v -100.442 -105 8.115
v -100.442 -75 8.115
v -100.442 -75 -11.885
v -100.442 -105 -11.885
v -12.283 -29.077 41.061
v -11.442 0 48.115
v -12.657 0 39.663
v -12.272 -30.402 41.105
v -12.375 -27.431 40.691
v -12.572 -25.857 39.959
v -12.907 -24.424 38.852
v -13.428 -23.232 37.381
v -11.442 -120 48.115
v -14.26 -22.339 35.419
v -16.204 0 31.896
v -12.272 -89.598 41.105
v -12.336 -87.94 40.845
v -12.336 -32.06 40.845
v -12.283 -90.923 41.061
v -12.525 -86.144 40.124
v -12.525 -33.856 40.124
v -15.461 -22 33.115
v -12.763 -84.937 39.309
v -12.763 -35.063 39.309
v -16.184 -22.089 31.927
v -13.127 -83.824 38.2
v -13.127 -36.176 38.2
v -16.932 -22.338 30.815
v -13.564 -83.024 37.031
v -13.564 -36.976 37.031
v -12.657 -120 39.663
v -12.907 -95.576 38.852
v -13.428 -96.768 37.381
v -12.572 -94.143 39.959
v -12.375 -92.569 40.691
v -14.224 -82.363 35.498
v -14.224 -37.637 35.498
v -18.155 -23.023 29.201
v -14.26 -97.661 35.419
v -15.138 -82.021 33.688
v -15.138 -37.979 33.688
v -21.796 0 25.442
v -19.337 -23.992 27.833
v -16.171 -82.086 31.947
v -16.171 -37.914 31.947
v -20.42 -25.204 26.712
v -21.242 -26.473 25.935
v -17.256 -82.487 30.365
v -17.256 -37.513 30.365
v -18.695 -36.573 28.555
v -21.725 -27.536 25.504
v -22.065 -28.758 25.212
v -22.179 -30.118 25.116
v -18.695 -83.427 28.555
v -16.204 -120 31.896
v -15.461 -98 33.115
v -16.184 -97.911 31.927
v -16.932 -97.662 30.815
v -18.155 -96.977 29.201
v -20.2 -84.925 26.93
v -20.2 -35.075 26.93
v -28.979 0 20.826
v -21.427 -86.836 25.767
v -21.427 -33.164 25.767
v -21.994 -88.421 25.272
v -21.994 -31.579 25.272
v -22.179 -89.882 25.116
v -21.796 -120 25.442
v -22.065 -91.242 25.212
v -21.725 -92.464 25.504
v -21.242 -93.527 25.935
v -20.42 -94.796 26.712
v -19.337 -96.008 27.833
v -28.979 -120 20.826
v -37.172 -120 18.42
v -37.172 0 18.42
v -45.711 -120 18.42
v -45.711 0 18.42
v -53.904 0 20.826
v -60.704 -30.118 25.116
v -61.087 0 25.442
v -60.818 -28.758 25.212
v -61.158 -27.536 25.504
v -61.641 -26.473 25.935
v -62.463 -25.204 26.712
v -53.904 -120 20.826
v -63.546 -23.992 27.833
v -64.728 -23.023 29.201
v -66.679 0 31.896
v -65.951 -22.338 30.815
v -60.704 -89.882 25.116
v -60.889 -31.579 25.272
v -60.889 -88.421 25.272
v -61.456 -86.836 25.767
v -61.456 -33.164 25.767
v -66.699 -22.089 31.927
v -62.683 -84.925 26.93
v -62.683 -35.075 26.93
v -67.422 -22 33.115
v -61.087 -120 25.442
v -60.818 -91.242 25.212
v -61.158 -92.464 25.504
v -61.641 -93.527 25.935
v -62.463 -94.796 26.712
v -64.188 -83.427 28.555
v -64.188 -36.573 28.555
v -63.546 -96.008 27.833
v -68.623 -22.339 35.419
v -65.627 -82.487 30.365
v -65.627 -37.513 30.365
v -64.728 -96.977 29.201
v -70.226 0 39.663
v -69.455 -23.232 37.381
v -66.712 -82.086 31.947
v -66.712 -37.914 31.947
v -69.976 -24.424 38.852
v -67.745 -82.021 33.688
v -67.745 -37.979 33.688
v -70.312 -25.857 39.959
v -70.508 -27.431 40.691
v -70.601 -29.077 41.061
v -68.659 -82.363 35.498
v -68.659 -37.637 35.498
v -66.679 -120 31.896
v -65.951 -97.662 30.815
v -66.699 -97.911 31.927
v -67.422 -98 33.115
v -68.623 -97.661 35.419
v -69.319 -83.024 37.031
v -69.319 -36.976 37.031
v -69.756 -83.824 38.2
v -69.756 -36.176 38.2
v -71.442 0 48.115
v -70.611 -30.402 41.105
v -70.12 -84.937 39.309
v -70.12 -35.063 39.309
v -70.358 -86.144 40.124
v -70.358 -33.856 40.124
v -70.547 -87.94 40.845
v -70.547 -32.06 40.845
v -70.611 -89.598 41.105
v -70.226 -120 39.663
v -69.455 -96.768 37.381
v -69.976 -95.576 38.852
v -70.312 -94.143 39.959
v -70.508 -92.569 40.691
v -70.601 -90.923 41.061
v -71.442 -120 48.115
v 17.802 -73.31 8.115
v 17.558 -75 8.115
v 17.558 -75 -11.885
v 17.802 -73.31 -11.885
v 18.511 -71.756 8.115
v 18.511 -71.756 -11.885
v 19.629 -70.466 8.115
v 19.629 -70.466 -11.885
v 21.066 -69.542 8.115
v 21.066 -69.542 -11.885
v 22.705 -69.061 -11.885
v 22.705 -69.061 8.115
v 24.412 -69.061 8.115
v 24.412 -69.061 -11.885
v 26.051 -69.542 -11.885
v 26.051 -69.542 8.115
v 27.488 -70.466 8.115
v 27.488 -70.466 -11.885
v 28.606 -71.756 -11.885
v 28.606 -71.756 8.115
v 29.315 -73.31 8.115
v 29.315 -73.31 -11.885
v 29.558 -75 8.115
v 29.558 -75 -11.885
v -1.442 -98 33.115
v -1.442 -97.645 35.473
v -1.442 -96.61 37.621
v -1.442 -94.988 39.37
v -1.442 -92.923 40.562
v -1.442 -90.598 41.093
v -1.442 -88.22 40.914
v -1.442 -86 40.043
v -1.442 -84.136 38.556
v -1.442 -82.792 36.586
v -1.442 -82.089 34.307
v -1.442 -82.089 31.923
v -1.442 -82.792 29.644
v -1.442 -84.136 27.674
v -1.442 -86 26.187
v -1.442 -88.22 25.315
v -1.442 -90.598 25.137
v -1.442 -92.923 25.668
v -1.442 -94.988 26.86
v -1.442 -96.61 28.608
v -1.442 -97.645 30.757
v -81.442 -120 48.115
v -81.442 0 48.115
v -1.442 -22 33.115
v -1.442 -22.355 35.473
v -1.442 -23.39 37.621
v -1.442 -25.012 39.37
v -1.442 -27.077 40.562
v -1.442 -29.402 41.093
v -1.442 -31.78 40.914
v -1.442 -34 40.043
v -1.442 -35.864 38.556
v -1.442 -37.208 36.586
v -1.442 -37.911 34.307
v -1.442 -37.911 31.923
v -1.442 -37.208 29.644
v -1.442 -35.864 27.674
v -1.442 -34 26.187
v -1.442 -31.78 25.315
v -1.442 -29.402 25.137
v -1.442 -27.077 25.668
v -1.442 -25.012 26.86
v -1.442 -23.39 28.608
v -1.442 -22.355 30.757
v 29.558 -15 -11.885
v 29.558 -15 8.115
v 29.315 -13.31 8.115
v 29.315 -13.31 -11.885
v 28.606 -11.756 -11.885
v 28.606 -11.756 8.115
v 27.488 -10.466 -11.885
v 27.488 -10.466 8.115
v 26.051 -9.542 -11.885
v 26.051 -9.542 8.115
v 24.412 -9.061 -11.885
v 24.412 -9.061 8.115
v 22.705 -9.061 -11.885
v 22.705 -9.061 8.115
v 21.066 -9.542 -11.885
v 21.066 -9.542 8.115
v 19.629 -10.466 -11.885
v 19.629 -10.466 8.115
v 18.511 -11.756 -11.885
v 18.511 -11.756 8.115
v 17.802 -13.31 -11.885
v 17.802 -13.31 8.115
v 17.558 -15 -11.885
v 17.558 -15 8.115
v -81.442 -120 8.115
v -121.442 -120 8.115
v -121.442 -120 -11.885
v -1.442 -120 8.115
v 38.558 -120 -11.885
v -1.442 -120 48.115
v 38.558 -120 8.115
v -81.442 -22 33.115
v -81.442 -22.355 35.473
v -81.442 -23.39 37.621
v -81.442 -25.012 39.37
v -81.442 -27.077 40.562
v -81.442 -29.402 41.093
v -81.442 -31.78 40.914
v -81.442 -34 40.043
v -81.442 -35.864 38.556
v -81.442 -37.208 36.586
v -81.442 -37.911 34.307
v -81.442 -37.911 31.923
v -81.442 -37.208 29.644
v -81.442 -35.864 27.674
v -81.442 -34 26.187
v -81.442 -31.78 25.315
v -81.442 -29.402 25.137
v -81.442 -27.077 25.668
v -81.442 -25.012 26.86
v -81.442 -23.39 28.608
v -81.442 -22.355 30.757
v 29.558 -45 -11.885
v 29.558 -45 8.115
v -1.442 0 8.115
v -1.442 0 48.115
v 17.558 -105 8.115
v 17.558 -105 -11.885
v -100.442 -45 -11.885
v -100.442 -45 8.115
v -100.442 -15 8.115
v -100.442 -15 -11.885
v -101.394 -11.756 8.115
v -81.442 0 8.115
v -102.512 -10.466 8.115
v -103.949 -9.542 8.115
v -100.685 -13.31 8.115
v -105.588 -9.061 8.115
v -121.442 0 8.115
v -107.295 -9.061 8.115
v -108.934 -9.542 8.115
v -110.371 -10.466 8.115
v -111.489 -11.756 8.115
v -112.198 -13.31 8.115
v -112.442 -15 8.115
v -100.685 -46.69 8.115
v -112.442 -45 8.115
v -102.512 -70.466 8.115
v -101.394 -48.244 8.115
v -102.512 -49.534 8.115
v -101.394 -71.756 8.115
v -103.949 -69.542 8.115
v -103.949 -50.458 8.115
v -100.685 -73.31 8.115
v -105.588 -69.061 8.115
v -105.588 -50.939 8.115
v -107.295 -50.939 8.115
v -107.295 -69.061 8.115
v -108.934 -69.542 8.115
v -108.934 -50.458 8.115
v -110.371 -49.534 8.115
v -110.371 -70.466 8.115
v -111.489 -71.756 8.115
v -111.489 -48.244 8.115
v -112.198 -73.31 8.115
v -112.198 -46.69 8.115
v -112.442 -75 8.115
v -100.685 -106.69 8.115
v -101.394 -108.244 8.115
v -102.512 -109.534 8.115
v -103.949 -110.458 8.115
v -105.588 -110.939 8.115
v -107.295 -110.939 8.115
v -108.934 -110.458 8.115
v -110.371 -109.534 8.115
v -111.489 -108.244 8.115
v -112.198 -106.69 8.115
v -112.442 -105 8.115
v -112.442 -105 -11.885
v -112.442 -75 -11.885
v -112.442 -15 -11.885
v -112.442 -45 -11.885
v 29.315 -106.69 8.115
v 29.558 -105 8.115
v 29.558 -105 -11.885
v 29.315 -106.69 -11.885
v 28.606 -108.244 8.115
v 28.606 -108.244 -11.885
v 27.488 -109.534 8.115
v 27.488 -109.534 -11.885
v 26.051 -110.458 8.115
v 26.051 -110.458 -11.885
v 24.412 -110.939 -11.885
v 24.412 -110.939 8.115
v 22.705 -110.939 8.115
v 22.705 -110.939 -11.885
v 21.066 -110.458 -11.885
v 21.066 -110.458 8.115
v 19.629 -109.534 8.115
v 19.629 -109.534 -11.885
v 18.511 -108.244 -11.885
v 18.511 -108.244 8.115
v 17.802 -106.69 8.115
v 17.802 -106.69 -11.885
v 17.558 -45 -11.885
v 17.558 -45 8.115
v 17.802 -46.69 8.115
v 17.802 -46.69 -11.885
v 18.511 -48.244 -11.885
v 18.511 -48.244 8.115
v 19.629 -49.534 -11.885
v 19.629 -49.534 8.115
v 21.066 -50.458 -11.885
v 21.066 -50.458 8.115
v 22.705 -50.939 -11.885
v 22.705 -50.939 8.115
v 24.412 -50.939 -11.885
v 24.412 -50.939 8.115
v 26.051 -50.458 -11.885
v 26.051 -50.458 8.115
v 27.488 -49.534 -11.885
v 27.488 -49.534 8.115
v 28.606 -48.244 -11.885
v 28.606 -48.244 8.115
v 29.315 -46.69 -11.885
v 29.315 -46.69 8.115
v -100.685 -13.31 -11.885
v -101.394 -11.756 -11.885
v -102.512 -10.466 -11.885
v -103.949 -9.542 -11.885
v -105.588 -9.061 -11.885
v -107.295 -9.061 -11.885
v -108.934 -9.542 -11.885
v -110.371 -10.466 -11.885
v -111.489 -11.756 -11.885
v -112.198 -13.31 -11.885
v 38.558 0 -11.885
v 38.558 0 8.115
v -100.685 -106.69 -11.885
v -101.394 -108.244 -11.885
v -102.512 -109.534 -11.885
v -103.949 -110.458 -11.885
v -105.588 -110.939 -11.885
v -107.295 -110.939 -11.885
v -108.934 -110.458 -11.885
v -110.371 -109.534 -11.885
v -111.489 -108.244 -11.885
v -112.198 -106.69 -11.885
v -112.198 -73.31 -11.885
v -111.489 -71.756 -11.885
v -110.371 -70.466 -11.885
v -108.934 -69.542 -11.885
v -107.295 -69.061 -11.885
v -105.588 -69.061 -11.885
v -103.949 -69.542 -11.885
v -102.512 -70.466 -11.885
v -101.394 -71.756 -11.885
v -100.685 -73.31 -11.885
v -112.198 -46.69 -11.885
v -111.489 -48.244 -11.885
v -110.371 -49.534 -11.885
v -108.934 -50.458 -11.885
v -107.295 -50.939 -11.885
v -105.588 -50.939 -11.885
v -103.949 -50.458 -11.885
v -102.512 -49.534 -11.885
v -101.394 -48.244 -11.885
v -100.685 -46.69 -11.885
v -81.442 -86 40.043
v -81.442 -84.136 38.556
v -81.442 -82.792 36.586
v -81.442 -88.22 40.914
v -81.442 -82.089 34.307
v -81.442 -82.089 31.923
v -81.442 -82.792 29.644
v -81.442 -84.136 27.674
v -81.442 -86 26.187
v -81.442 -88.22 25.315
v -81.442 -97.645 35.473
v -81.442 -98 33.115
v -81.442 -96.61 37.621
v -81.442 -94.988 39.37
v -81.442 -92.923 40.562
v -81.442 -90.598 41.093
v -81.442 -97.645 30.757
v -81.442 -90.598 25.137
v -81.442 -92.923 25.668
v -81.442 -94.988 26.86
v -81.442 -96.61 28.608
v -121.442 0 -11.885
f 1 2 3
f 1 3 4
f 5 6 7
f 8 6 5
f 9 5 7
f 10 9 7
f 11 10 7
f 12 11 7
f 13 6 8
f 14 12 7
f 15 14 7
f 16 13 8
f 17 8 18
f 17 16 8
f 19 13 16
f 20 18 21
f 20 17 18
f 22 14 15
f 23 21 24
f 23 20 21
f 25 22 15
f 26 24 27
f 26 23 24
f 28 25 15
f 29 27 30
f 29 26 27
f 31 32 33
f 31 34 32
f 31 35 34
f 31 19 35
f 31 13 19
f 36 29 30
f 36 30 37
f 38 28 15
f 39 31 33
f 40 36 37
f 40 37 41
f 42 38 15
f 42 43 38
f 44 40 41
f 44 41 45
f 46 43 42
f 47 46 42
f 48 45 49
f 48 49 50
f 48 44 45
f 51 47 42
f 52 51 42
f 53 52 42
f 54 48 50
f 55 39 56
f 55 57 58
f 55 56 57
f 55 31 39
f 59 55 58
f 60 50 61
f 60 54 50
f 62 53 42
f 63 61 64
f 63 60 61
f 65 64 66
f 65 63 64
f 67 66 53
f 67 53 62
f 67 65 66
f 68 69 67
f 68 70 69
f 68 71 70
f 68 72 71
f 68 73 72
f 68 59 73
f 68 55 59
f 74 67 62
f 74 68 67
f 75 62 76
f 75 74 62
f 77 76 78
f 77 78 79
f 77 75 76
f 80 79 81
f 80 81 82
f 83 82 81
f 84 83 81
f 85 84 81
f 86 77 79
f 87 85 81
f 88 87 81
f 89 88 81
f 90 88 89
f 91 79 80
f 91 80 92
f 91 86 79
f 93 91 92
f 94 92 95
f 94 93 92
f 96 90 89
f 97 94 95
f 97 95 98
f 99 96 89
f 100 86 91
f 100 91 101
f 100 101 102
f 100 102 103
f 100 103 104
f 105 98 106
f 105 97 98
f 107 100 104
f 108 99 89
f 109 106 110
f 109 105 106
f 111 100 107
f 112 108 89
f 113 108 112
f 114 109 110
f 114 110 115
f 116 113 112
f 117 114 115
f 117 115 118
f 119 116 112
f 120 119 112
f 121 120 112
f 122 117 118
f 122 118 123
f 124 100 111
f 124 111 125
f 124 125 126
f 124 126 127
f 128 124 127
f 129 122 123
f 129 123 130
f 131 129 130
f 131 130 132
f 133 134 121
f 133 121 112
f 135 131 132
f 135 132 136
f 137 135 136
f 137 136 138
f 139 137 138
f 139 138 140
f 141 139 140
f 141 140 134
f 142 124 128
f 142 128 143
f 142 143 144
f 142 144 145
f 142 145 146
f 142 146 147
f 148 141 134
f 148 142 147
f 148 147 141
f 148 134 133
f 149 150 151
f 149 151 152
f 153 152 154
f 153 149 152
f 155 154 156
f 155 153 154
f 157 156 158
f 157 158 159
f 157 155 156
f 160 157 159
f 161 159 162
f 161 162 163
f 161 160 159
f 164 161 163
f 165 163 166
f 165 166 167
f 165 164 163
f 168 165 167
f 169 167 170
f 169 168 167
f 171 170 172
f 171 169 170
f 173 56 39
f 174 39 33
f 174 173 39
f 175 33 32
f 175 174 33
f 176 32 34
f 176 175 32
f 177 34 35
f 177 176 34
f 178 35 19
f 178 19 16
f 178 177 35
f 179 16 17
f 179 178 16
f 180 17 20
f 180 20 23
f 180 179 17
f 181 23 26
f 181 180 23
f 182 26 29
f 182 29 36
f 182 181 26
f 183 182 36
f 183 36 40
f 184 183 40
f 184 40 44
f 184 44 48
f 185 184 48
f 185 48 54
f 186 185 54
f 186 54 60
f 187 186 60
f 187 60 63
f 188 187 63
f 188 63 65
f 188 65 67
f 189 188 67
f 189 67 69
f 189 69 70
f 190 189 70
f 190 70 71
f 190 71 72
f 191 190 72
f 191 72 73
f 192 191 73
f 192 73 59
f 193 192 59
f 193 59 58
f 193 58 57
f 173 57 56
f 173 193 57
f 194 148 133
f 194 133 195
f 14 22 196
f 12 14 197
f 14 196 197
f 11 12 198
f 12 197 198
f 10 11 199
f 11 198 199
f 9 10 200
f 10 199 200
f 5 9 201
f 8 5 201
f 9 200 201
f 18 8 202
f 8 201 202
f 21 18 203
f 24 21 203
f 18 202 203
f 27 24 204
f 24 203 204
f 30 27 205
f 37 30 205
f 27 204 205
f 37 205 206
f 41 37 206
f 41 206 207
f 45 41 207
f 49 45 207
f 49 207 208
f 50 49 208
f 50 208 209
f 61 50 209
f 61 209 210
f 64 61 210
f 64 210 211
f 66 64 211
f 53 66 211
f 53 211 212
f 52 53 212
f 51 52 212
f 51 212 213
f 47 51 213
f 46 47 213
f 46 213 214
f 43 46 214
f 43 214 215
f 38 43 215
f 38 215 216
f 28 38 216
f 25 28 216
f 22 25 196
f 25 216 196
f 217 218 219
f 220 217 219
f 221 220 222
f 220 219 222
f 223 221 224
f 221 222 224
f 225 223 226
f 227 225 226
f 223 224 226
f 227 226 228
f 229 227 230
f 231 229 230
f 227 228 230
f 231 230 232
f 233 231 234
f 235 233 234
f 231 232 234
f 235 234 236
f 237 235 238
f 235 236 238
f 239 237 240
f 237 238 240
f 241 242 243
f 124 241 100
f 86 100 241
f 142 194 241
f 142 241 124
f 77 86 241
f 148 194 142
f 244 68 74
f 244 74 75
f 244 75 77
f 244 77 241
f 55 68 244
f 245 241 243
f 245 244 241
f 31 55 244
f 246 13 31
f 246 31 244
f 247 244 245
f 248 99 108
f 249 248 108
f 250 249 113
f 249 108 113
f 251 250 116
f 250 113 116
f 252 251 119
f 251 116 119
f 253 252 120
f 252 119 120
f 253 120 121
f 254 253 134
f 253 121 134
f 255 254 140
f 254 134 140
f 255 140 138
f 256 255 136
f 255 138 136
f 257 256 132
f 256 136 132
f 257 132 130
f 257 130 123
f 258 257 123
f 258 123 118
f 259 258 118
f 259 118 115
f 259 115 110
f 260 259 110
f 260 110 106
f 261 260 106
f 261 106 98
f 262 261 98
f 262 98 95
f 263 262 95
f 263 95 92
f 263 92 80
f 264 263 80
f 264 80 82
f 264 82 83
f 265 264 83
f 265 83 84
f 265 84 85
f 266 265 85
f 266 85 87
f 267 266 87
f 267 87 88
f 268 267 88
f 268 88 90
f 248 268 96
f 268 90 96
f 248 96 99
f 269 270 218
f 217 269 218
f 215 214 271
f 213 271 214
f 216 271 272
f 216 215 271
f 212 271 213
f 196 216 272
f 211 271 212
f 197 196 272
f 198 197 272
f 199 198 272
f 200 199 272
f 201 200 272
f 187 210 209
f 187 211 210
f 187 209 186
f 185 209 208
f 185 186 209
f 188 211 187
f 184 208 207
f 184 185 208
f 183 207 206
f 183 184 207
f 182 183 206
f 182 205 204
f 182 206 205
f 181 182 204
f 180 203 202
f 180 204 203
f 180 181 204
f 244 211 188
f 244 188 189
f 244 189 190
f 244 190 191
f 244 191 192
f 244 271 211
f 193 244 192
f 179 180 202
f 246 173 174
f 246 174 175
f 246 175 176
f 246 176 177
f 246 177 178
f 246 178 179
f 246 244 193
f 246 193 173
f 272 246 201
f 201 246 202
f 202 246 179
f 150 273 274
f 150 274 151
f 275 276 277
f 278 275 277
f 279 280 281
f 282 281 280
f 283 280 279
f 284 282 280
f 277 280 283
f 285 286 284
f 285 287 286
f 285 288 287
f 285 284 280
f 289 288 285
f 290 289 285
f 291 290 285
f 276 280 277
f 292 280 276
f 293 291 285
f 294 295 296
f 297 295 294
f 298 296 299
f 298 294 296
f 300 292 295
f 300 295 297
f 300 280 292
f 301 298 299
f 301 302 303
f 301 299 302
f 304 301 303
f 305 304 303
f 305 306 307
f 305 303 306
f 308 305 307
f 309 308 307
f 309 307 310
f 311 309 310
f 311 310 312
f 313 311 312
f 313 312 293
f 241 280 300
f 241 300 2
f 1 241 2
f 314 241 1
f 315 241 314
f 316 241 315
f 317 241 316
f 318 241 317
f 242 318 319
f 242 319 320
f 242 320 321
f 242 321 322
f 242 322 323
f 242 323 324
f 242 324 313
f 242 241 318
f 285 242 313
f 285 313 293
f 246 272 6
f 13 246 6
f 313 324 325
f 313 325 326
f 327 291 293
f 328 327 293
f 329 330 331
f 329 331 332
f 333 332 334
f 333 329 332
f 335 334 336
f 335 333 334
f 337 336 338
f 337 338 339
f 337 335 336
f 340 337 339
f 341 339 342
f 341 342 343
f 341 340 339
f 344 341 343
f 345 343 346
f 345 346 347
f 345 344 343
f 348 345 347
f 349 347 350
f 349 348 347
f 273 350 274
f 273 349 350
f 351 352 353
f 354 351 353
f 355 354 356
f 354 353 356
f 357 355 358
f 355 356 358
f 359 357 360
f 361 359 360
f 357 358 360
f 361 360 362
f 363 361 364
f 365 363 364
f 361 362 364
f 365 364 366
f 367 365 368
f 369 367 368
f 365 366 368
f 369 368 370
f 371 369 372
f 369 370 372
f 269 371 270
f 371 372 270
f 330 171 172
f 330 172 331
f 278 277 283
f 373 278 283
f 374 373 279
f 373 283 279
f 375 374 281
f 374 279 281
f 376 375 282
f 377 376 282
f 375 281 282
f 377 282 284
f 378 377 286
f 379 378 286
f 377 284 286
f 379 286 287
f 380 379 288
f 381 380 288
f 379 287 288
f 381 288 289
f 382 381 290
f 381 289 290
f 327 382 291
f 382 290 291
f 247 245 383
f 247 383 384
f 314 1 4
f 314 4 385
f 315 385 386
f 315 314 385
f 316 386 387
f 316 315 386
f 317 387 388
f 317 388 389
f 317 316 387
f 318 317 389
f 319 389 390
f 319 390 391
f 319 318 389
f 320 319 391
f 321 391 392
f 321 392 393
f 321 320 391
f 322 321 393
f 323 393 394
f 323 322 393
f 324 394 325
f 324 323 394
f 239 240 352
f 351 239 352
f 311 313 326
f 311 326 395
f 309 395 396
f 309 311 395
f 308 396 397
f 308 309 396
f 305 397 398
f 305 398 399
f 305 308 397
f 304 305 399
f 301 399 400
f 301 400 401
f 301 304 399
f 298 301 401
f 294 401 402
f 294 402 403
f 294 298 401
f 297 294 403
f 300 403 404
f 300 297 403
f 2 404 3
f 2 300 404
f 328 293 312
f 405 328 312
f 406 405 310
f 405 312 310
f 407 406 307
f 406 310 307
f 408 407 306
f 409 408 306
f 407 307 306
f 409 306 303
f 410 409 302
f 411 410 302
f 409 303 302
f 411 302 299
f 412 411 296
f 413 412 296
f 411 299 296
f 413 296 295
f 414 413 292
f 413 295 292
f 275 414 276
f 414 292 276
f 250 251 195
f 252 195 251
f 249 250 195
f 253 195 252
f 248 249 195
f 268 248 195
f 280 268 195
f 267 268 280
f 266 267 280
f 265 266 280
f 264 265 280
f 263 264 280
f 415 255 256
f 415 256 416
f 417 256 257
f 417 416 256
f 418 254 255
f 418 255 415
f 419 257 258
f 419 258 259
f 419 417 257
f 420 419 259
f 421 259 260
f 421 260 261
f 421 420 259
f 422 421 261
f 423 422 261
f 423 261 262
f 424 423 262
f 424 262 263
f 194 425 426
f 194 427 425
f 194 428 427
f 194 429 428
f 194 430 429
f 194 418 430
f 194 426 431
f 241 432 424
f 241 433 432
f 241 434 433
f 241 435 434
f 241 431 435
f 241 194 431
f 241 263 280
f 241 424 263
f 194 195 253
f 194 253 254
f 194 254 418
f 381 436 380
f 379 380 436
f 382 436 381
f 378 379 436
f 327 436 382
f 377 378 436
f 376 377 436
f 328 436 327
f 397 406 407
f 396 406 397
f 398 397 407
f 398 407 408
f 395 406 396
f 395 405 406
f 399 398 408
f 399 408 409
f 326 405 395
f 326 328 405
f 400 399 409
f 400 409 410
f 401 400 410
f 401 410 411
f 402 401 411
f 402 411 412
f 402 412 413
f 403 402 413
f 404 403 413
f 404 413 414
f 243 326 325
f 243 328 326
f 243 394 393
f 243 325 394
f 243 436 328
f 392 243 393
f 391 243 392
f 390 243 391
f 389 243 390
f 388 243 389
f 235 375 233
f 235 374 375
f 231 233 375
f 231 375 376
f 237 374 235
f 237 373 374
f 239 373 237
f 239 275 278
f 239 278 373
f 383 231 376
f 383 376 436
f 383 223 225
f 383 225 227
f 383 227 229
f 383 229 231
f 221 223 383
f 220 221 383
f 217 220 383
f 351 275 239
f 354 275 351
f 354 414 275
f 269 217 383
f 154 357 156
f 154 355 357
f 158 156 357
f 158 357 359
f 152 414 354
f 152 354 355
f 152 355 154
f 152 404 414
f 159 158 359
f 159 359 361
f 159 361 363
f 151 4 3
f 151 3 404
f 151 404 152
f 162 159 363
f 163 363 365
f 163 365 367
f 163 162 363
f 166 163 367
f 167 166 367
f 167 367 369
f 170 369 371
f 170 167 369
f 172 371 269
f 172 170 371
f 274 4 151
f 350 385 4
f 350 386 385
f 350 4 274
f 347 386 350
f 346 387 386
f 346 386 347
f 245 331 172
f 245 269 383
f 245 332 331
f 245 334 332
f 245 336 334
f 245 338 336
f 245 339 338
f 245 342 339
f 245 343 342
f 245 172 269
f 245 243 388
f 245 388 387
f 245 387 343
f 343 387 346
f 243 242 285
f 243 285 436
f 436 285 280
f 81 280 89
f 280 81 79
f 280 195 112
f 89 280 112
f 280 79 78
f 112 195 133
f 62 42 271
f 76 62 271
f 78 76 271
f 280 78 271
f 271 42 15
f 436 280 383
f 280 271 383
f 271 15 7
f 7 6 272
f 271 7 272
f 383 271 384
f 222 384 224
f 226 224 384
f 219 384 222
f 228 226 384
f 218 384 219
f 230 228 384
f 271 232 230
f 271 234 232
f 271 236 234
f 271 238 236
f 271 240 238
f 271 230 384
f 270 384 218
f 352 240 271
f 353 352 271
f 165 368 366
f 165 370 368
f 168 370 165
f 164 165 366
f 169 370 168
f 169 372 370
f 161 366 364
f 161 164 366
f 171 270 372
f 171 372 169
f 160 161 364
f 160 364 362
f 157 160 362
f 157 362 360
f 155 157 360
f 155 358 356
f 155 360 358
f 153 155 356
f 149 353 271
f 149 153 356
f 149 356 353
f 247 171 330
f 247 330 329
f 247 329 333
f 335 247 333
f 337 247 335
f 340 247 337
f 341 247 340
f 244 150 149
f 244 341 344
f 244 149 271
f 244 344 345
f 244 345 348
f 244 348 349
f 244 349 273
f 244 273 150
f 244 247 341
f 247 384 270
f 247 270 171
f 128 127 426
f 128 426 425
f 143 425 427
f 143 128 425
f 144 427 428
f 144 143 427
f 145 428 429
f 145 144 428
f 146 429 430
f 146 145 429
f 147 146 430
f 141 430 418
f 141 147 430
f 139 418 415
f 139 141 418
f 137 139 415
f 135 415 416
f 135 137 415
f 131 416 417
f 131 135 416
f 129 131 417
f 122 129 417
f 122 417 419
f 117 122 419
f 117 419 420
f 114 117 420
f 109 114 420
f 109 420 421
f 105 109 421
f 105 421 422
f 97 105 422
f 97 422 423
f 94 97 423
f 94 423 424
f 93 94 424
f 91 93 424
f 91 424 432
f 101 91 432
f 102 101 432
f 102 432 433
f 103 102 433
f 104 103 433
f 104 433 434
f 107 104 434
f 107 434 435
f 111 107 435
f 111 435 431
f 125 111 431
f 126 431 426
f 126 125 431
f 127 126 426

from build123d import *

# Parameters (mm, degrees)
F1_DEPTH = 60
F3_DEPTH = 20
F5_DEPTH = 20
F6_R     = 8
F7_DEPTH = 80


with BuildPart() as f1:
    # F0 (on Front) → F1 (new body)
    with BuildSketch(Plane.XZ):
        with BuildLine():
            Line((-71.441528, 48.114919), (-81.441528, 48.114919))
            Line((-81.441528, 48.114919), (-81.441528, 8.114919))
            Line((-81.441528, 8.114919), (-121.441528, 8.114919))
            Line((-121.441528, 8.114919), (-121.441528, -11.885081))
            Line((-121.441528, -11.885081), (38.558472, -11.885081))
            Line((38.558472, -11.885081), (38.558472, 8.114919))
            Line((38.558472, 8.114919), (-1.441528, 8.114919))
            Line((-1.441528, 8.114919), (-1.441528, 48.114919))
            Line((-1.441528, 48.114919), (-11.441528, 48.114919))
            ThreePointArc((-11.441528, 48.114919), (-41.441528, 18.114919), (-71.441528, 48.114919))
        make_face()
    extrude(amount=F1_DEPTH)

    # F2 (on face) → F3 (cut)
    with BuildSketch(Plane.XY.offset(8.114919)):
        with BuildLine():
            Line((29.558472, -45), (29.558472, -15))
            ThreePointArc((29.558472, -15), (23.558472, -9), (17.558472, -15))
            Line((17.558472, -15), (17.558472, -45))
            ThreePointArc((17.558472, -45), (23.558472, -51), (29.558472, -45))
        make_face()
    extrude(amount=-F3_DEPTH, mode=Mode.SUBTRACT)

    # F4 (on face) → F5 (cut)
    with BuildSketch(Plane.XY.offset(8.114919)):
        with BuildLine():
            Line((-112.441528, -15), (-112.441528, -45))
            ThreePointArc((-112.441528, -45), (-106.441528, -51), (-100.441528, -45))
            Line((-100.441528, -45), (-100.441528, -15))
            ThreePointArc((-100.441528, -15), (-106.441528, -9), (-112.441528, -15))
        make_face()
    extrude(amount=-F5_DEPTH, mode=Mode.SUBTRACT)

    # F6 (on face) → F7 (cut)
    with BuildSketch(Plane.YZ.offset(-1.441528)):
        with Locations((-30, 33.114919)):
            Circle(F6_R)
    extrude(amount=-F7_DEPTH, mode=Mode.SUBTRACT)

    # F8: F1 across face


with BuildPart() as f1_1:
    add(f1.part)
    add(f1.part.mirror(Plane(origin=(-41.441528, -60, 6.801582), x_dir=(1, 0, 0), z_dir=(0, -1, 0))))


solid = f1_1.part
